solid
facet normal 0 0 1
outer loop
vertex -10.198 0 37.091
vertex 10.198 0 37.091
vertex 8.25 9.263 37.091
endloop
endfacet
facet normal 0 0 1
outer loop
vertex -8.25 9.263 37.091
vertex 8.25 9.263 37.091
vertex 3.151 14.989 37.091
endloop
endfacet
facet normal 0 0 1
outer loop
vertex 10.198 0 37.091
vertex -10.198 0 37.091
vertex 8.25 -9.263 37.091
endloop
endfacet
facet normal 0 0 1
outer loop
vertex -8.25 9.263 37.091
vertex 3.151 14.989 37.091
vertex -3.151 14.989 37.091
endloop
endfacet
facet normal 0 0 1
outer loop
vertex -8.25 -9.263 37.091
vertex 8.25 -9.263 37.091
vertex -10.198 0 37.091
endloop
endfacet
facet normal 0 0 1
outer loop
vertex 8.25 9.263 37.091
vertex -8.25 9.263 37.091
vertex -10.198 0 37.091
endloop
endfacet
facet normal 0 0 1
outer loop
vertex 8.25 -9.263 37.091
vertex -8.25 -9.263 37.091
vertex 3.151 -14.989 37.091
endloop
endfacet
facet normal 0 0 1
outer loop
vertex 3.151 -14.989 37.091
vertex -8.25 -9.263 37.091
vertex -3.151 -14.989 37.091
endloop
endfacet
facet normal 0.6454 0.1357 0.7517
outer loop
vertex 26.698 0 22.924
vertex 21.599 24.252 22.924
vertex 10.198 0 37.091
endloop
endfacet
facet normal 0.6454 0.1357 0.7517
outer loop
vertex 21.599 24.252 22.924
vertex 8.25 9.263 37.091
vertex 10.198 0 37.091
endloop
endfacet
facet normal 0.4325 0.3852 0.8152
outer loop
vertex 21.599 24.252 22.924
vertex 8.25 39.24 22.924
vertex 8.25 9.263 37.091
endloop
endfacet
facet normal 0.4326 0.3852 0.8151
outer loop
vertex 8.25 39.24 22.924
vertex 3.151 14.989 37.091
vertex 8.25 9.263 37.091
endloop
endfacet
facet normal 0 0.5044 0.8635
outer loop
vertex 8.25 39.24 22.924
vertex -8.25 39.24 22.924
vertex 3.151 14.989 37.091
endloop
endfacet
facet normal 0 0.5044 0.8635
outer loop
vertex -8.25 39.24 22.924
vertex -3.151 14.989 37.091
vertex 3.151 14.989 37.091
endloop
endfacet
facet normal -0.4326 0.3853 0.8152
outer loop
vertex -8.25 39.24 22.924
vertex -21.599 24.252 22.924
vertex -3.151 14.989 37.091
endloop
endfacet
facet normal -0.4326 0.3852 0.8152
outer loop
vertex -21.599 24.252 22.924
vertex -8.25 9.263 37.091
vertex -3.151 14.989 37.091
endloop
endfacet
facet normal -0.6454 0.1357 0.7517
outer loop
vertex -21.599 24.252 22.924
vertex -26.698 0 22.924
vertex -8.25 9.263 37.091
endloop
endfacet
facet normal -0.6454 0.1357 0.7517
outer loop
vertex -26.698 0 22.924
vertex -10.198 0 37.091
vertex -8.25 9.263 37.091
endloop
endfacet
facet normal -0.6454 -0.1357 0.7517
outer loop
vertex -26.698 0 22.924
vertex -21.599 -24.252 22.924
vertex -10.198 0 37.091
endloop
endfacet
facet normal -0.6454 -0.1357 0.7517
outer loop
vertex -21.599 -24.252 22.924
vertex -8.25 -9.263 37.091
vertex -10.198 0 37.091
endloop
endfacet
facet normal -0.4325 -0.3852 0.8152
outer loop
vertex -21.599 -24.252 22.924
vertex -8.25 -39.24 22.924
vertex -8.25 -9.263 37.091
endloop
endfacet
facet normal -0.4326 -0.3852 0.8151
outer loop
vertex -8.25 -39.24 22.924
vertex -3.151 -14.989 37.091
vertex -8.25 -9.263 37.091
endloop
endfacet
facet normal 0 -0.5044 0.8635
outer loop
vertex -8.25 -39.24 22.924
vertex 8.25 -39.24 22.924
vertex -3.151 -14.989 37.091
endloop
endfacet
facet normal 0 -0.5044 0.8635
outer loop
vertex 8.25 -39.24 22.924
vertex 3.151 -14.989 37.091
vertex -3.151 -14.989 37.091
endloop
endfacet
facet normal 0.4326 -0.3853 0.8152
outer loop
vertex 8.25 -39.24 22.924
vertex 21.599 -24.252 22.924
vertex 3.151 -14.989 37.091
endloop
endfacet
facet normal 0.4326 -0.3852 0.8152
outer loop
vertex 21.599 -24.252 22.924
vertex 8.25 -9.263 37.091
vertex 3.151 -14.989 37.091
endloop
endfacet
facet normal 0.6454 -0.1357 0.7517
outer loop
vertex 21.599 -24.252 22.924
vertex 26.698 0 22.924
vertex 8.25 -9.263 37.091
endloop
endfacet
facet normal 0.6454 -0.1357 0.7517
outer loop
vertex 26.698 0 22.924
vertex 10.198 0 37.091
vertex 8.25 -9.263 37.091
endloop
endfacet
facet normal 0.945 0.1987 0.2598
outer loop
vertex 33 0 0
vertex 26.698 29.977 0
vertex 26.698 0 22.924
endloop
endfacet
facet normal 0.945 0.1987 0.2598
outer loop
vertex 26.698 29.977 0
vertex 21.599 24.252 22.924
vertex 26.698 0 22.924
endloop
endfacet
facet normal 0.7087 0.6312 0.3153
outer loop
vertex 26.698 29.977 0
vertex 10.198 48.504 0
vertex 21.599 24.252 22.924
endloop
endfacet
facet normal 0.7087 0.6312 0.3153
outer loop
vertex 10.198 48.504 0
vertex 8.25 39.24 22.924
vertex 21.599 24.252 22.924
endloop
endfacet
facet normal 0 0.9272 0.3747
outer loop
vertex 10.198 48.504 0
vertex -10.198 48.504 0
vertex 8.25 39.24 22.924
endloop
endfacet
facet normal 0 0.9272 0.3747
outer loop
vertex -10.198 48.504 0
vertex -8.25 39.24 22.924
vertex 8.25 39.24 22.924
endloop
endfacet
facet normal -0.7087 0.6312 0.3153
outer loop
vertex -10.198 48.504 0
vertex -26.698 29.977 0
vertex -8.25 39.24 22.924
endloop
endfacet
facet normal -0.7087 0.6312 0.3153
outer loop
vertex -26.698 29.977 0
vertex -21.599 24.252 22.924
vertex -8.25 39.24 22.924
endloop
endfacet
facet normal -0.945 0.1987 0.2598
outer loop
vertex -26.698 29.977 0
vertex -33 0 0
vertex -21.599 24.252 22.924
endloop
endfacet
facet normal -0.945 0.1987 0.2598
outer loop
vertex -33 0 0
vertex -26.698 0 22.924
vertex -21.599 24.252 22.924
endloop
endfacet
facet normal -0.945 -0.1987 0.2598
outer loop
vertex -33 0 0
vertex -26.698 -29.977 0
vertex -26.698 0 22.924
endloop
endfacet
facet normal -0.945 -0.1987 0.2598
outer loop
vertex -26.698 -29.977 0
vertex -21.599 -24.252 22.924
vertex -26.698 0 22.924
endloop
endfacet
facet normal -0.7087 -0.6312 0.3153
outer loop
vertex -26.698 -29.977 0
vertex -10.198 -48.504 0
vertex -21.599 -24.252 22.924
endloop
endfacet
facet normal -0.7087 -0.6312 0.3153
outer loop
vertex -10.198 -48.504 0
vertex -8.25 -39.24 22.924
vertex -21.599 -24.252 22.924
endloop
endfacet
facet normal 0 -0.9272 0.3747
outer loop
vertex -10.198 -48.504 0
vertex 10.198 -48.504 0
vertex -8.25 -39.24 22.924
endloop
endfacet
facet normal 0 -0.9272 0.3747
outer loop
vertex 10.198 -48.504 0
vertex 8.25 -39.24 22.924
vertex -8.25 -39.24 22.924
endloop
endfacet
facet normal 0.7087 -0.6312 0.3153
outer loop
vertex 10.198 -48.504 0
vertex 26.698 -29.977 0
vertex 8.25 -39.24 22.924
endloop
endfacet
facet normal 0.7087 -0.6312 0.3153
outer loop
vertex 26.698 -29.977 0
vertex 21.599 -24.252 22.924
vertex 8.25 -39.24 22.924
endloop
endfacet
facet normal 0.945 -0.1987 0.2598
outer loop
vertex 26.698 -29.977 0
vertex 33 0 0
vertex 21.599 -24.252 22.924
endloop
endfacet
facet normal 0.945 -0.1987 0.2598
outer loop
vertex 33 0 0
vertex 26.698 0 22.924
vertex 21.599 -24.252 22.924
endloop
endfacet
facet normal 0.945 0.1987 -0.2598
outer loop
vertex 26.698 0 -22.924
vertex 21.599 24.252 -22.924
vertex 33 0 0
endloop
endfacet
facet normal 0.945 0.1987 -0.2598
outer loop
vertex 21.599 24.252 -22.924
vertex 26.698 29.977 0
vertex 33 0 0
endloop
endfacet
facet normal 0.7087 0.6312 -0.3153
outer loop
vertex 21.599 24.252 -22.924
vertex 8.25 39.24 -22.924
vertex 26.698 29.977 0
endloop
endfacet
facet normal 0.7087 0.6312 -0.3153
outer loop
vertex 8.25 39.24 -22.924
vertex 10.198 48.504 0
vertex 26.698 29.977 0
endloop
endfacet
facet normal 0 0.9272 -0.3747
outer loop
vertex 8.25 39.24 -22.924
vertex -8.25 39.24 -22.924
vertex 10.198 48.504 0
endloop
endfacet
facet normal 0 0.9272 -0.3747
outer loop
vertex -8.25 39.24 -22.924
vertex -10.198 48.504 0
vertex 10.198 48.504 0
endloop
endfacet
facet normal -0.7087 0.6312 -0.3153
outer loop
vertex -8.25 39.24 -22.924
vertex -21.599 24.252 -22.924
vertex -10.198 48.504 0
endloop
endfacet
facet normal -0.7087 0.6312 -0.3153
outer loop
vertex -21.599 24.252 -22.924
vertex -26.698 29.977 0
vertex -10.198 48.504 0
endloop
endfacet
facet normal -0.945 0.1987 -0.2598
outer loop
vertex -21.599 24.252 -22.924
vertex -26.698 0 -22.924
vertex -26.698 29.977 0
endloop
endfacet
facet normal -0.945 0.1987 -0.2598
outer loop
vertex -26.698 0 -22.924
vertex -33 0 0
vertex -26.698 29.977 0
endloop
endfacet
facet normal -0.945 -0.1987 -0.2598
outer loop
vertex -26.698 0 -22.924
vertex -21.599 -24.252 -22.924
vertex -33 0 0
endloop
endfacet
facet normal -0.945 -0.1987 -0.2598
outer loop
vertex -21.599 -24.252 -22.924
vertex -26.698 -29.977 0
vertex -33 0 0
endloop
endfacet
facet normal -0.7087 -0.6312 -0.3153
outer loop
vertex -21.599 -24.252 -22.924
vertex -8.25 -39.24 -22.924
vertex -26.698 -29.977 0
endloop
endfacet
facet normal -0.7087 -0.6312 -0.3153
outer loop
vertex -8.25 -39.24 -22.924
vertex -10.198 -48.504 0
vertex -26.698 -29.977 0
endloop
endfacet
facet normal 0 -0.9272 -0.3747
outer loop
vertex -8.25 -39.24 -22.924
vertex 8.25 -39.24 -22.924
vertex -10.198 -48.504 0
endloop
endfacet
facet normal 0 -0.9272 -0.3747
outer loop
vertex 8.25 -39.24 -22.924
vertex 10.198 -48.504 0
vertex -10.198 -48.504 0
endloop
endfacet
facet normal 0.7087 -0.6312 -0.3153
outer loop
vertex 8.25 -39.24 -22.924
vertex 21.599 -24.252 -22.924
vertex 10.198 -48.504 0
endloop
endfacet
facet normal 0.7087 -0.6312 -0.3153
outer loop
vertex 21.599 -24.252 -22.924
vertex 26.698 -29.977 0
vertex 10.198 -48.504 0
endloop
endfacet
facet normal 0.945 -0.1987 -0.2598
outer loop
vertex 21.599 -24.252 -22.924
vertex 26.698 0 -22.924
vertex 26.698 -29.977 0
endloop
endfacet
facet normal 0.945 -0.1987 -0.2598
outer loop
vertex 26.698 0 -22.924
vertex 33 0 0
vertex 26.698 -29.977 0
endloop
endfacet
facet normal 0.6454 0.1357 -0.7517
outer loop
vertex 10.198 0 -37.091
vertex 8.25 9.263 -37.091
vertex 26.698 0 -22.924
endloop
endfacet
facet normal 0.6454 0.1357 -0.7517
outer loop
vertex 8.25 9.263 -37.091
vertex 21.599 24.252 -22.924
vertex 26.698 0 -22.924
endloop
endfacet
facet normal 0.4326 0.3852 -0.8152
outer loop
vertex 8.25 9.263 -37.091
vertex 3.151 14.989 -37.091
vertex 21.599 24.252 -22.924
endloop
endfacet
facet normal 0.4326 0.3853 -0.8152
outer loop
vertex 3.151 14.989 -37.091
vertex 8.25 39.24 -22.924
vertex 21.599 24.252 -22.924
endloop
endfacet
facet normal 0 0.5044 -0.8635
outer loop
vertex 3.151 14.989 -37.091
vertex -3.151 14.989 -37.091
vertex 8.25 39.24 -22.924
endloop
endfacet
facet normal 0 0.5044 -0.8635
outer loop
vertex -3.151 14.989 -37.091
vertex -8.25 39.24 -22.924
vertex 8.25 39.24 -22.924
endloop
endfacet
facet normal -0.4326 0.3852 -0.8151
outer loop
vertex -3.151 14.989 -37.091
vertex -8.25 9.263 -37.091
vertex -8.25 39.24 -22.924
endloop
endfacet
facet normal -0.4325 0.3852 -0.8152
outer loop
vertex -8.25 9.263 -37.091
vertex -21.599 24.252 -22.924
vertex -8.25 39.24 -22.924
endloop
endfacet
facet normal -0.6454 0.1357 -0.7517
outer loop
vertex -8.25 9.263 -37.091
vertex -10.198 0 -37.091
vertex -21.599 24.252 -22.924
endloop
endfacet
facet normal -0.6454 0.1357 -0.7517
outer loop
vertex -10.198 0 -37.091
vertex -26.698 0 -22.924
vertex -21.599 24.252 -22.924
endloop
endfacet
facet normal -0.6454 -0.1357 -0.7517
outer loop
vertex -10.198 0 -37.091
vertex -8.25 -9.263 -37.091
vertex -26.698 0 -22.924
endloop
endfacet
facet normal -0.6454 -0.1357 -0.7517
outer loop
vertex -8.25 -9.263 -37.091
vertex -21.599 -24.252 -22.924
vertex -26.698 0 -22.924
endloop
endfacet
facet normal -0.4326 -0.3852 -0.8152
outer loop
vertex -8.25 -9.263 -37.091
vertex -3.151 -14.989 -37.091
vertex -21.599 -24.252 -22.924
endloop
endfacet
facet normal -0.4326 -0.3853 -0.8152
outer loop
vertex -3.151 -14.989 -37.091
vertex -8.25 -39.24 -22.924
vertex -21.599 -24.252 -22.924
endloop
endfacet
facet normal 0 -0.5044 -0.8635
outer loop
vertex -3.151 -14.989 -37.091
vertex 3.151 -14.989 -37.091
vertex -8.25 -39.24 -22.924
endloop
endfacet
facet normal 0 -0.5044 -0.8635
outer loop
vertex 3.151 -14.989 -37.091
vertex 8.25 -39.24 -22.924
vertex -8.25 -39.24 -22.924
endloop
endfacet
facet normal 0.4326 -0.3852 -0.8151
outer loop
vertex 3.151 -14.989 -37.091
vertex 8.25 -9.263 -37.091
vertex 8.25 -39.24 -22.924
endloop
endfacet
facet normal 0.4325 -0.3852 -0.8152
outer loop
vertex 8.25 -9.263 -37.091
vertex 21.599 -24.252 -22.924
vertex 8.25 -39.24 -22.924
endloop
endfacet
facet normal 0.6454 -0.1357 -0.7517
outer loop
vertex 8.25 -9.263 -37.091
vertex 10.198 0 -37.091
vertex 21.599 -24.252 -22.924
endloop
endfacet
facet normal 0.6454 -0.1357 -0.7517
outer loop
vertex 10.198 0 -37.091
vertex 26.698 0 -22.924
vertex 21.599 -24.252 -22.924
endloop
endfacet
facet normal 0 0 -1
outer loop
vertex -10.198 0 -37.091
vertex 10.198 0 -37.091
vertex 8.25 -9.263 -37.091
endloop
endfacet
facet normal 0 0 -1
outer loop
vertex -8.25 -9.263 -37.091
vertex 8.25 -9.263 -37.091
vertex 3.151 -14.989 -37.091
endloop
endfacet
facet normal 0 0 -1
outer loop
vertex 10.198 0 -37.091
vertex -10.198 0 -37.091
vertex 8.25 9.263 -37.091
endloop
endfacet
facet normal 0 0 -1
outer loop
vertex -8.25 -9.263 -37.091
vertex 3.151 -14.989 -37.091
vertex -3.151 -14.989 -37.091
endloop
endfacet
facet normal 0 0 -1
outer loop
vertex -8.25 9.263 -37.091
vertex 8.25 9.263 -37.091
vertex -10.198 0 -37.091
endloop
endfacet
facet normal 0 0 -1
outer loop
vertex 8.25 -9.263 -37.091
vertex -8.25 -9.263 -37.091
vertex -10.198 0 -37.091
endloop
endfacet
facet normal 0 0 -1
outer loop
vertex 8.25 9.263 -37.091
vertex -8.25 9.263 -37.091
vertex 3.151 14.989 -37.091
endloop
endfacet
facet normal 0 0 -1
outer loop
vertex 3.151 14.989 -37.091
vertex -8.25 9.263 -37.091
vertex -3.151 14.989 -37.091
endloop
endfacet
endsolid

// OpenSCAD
// Generated by SolidPython 1.0.1 on 2020-07-29 00:46:50


scale(v = [11, 17, 13]) {
	sphere(r = 3);
}
/***********************************************
*********      SolidPython code:      **********
************************************************
 
# import packages: SolidPython
from solid import *
from solid.utils import *
from itertools import chain, combinations, permutations


class Resize:

    def __init__(self, scad_file):
        self.scad_file = scad_file
        #self.scad_file = import_scad(scad_file)
        # cone/cylinder param:
        self.r1 = 0
        self.r2 = 0
        self.h = 0
        # rectangular prism param:
        self.w = 0
        self.l = 0
        # ellipse param:
        self.r = 0

    # import OpenScad code (file name corresponds to shape)


    # classify shape + parameters
    def assign(self, param1, param2, param3):
        if self.scad_file == 'cone.scad':
            self.r1 = param1
            self.r2 = param2
            self.h = param3
        elif self.scad_file == 'cylinder.scad':
            self.r1 = param1
            self.r2 = param2
            self.h = param3
        elif self.scad_file == 'rectangularPrism.scad':
            self.h = param1
            self.l = param2
            self.w = param3
        else:
            self.r = param1
            self.h = param2

    # resize parameters
    def iterate(self):
        x = range(3, 20, 2)
        i = 1
        if self.scad_file == 'cone.scad':
            tempList = list(permutations(x, 2))
            for temp in tempList:
                param1 = temp[0]
                param2 = temp[1]
                filepath = 'produced_scad_files/' + 'cone' + str(param1) + '_' + str(param2) + '_' + '.scad'
                scad_render_to_file(cylinder(h=param1, r1=param2, r2=0), filepath)

        elif self.scad_file == 'cylinder.scad':
            tempList = list(permutations(x, 3))
            for temp in tempList:
                param1 = temp[0]
                param2 = temp[1]
                filepath = 'produced_scad_files/' + 'cylinder' + str(param1) + '_' + str(param2) + '_' + '.scad'
                scad_render_to_file(cylinder(h=param1, r1=param2, r2=param2), filepath)

        elif self.scad_file == 'rectangularPrism.scad':
            tempList = list(permutations(x, 3))
            for temp in tempList:
                param1 = temp[0]
                param2 = temp[1]
                param3 = temp[2]
                filepath = 'produced_scad_files/' + 'rectangularPrism' + str(param1) + '_' + str(param2) + '_' + str(
                    param3) + '.scad'
                scad_render_to_file(cube(size=(param1, param2, param3)), filepath)

        elif self.scad_file == 'ellipse.scad':
            tempList = list(permutations(x, 4))
            for temp in tempList:
                param1 = temp[0]
                param2 = temp[1]
                param3 = temp[2]
                param4 = temp[3]
                filepath = 'produced_scad_files/' + 'ellipse' + str(param1) + '_' + str(param2) + '_' + str(param3) + '_' + str(param4) + '.scad'
                scad_render_to_file(scale([param1, param2, param3])(sphere(r=param4)), filepath)

    def render_to_scadfile(self):
        scad_render_to_file(scad, 'example.scad') 
 
************************************************/
